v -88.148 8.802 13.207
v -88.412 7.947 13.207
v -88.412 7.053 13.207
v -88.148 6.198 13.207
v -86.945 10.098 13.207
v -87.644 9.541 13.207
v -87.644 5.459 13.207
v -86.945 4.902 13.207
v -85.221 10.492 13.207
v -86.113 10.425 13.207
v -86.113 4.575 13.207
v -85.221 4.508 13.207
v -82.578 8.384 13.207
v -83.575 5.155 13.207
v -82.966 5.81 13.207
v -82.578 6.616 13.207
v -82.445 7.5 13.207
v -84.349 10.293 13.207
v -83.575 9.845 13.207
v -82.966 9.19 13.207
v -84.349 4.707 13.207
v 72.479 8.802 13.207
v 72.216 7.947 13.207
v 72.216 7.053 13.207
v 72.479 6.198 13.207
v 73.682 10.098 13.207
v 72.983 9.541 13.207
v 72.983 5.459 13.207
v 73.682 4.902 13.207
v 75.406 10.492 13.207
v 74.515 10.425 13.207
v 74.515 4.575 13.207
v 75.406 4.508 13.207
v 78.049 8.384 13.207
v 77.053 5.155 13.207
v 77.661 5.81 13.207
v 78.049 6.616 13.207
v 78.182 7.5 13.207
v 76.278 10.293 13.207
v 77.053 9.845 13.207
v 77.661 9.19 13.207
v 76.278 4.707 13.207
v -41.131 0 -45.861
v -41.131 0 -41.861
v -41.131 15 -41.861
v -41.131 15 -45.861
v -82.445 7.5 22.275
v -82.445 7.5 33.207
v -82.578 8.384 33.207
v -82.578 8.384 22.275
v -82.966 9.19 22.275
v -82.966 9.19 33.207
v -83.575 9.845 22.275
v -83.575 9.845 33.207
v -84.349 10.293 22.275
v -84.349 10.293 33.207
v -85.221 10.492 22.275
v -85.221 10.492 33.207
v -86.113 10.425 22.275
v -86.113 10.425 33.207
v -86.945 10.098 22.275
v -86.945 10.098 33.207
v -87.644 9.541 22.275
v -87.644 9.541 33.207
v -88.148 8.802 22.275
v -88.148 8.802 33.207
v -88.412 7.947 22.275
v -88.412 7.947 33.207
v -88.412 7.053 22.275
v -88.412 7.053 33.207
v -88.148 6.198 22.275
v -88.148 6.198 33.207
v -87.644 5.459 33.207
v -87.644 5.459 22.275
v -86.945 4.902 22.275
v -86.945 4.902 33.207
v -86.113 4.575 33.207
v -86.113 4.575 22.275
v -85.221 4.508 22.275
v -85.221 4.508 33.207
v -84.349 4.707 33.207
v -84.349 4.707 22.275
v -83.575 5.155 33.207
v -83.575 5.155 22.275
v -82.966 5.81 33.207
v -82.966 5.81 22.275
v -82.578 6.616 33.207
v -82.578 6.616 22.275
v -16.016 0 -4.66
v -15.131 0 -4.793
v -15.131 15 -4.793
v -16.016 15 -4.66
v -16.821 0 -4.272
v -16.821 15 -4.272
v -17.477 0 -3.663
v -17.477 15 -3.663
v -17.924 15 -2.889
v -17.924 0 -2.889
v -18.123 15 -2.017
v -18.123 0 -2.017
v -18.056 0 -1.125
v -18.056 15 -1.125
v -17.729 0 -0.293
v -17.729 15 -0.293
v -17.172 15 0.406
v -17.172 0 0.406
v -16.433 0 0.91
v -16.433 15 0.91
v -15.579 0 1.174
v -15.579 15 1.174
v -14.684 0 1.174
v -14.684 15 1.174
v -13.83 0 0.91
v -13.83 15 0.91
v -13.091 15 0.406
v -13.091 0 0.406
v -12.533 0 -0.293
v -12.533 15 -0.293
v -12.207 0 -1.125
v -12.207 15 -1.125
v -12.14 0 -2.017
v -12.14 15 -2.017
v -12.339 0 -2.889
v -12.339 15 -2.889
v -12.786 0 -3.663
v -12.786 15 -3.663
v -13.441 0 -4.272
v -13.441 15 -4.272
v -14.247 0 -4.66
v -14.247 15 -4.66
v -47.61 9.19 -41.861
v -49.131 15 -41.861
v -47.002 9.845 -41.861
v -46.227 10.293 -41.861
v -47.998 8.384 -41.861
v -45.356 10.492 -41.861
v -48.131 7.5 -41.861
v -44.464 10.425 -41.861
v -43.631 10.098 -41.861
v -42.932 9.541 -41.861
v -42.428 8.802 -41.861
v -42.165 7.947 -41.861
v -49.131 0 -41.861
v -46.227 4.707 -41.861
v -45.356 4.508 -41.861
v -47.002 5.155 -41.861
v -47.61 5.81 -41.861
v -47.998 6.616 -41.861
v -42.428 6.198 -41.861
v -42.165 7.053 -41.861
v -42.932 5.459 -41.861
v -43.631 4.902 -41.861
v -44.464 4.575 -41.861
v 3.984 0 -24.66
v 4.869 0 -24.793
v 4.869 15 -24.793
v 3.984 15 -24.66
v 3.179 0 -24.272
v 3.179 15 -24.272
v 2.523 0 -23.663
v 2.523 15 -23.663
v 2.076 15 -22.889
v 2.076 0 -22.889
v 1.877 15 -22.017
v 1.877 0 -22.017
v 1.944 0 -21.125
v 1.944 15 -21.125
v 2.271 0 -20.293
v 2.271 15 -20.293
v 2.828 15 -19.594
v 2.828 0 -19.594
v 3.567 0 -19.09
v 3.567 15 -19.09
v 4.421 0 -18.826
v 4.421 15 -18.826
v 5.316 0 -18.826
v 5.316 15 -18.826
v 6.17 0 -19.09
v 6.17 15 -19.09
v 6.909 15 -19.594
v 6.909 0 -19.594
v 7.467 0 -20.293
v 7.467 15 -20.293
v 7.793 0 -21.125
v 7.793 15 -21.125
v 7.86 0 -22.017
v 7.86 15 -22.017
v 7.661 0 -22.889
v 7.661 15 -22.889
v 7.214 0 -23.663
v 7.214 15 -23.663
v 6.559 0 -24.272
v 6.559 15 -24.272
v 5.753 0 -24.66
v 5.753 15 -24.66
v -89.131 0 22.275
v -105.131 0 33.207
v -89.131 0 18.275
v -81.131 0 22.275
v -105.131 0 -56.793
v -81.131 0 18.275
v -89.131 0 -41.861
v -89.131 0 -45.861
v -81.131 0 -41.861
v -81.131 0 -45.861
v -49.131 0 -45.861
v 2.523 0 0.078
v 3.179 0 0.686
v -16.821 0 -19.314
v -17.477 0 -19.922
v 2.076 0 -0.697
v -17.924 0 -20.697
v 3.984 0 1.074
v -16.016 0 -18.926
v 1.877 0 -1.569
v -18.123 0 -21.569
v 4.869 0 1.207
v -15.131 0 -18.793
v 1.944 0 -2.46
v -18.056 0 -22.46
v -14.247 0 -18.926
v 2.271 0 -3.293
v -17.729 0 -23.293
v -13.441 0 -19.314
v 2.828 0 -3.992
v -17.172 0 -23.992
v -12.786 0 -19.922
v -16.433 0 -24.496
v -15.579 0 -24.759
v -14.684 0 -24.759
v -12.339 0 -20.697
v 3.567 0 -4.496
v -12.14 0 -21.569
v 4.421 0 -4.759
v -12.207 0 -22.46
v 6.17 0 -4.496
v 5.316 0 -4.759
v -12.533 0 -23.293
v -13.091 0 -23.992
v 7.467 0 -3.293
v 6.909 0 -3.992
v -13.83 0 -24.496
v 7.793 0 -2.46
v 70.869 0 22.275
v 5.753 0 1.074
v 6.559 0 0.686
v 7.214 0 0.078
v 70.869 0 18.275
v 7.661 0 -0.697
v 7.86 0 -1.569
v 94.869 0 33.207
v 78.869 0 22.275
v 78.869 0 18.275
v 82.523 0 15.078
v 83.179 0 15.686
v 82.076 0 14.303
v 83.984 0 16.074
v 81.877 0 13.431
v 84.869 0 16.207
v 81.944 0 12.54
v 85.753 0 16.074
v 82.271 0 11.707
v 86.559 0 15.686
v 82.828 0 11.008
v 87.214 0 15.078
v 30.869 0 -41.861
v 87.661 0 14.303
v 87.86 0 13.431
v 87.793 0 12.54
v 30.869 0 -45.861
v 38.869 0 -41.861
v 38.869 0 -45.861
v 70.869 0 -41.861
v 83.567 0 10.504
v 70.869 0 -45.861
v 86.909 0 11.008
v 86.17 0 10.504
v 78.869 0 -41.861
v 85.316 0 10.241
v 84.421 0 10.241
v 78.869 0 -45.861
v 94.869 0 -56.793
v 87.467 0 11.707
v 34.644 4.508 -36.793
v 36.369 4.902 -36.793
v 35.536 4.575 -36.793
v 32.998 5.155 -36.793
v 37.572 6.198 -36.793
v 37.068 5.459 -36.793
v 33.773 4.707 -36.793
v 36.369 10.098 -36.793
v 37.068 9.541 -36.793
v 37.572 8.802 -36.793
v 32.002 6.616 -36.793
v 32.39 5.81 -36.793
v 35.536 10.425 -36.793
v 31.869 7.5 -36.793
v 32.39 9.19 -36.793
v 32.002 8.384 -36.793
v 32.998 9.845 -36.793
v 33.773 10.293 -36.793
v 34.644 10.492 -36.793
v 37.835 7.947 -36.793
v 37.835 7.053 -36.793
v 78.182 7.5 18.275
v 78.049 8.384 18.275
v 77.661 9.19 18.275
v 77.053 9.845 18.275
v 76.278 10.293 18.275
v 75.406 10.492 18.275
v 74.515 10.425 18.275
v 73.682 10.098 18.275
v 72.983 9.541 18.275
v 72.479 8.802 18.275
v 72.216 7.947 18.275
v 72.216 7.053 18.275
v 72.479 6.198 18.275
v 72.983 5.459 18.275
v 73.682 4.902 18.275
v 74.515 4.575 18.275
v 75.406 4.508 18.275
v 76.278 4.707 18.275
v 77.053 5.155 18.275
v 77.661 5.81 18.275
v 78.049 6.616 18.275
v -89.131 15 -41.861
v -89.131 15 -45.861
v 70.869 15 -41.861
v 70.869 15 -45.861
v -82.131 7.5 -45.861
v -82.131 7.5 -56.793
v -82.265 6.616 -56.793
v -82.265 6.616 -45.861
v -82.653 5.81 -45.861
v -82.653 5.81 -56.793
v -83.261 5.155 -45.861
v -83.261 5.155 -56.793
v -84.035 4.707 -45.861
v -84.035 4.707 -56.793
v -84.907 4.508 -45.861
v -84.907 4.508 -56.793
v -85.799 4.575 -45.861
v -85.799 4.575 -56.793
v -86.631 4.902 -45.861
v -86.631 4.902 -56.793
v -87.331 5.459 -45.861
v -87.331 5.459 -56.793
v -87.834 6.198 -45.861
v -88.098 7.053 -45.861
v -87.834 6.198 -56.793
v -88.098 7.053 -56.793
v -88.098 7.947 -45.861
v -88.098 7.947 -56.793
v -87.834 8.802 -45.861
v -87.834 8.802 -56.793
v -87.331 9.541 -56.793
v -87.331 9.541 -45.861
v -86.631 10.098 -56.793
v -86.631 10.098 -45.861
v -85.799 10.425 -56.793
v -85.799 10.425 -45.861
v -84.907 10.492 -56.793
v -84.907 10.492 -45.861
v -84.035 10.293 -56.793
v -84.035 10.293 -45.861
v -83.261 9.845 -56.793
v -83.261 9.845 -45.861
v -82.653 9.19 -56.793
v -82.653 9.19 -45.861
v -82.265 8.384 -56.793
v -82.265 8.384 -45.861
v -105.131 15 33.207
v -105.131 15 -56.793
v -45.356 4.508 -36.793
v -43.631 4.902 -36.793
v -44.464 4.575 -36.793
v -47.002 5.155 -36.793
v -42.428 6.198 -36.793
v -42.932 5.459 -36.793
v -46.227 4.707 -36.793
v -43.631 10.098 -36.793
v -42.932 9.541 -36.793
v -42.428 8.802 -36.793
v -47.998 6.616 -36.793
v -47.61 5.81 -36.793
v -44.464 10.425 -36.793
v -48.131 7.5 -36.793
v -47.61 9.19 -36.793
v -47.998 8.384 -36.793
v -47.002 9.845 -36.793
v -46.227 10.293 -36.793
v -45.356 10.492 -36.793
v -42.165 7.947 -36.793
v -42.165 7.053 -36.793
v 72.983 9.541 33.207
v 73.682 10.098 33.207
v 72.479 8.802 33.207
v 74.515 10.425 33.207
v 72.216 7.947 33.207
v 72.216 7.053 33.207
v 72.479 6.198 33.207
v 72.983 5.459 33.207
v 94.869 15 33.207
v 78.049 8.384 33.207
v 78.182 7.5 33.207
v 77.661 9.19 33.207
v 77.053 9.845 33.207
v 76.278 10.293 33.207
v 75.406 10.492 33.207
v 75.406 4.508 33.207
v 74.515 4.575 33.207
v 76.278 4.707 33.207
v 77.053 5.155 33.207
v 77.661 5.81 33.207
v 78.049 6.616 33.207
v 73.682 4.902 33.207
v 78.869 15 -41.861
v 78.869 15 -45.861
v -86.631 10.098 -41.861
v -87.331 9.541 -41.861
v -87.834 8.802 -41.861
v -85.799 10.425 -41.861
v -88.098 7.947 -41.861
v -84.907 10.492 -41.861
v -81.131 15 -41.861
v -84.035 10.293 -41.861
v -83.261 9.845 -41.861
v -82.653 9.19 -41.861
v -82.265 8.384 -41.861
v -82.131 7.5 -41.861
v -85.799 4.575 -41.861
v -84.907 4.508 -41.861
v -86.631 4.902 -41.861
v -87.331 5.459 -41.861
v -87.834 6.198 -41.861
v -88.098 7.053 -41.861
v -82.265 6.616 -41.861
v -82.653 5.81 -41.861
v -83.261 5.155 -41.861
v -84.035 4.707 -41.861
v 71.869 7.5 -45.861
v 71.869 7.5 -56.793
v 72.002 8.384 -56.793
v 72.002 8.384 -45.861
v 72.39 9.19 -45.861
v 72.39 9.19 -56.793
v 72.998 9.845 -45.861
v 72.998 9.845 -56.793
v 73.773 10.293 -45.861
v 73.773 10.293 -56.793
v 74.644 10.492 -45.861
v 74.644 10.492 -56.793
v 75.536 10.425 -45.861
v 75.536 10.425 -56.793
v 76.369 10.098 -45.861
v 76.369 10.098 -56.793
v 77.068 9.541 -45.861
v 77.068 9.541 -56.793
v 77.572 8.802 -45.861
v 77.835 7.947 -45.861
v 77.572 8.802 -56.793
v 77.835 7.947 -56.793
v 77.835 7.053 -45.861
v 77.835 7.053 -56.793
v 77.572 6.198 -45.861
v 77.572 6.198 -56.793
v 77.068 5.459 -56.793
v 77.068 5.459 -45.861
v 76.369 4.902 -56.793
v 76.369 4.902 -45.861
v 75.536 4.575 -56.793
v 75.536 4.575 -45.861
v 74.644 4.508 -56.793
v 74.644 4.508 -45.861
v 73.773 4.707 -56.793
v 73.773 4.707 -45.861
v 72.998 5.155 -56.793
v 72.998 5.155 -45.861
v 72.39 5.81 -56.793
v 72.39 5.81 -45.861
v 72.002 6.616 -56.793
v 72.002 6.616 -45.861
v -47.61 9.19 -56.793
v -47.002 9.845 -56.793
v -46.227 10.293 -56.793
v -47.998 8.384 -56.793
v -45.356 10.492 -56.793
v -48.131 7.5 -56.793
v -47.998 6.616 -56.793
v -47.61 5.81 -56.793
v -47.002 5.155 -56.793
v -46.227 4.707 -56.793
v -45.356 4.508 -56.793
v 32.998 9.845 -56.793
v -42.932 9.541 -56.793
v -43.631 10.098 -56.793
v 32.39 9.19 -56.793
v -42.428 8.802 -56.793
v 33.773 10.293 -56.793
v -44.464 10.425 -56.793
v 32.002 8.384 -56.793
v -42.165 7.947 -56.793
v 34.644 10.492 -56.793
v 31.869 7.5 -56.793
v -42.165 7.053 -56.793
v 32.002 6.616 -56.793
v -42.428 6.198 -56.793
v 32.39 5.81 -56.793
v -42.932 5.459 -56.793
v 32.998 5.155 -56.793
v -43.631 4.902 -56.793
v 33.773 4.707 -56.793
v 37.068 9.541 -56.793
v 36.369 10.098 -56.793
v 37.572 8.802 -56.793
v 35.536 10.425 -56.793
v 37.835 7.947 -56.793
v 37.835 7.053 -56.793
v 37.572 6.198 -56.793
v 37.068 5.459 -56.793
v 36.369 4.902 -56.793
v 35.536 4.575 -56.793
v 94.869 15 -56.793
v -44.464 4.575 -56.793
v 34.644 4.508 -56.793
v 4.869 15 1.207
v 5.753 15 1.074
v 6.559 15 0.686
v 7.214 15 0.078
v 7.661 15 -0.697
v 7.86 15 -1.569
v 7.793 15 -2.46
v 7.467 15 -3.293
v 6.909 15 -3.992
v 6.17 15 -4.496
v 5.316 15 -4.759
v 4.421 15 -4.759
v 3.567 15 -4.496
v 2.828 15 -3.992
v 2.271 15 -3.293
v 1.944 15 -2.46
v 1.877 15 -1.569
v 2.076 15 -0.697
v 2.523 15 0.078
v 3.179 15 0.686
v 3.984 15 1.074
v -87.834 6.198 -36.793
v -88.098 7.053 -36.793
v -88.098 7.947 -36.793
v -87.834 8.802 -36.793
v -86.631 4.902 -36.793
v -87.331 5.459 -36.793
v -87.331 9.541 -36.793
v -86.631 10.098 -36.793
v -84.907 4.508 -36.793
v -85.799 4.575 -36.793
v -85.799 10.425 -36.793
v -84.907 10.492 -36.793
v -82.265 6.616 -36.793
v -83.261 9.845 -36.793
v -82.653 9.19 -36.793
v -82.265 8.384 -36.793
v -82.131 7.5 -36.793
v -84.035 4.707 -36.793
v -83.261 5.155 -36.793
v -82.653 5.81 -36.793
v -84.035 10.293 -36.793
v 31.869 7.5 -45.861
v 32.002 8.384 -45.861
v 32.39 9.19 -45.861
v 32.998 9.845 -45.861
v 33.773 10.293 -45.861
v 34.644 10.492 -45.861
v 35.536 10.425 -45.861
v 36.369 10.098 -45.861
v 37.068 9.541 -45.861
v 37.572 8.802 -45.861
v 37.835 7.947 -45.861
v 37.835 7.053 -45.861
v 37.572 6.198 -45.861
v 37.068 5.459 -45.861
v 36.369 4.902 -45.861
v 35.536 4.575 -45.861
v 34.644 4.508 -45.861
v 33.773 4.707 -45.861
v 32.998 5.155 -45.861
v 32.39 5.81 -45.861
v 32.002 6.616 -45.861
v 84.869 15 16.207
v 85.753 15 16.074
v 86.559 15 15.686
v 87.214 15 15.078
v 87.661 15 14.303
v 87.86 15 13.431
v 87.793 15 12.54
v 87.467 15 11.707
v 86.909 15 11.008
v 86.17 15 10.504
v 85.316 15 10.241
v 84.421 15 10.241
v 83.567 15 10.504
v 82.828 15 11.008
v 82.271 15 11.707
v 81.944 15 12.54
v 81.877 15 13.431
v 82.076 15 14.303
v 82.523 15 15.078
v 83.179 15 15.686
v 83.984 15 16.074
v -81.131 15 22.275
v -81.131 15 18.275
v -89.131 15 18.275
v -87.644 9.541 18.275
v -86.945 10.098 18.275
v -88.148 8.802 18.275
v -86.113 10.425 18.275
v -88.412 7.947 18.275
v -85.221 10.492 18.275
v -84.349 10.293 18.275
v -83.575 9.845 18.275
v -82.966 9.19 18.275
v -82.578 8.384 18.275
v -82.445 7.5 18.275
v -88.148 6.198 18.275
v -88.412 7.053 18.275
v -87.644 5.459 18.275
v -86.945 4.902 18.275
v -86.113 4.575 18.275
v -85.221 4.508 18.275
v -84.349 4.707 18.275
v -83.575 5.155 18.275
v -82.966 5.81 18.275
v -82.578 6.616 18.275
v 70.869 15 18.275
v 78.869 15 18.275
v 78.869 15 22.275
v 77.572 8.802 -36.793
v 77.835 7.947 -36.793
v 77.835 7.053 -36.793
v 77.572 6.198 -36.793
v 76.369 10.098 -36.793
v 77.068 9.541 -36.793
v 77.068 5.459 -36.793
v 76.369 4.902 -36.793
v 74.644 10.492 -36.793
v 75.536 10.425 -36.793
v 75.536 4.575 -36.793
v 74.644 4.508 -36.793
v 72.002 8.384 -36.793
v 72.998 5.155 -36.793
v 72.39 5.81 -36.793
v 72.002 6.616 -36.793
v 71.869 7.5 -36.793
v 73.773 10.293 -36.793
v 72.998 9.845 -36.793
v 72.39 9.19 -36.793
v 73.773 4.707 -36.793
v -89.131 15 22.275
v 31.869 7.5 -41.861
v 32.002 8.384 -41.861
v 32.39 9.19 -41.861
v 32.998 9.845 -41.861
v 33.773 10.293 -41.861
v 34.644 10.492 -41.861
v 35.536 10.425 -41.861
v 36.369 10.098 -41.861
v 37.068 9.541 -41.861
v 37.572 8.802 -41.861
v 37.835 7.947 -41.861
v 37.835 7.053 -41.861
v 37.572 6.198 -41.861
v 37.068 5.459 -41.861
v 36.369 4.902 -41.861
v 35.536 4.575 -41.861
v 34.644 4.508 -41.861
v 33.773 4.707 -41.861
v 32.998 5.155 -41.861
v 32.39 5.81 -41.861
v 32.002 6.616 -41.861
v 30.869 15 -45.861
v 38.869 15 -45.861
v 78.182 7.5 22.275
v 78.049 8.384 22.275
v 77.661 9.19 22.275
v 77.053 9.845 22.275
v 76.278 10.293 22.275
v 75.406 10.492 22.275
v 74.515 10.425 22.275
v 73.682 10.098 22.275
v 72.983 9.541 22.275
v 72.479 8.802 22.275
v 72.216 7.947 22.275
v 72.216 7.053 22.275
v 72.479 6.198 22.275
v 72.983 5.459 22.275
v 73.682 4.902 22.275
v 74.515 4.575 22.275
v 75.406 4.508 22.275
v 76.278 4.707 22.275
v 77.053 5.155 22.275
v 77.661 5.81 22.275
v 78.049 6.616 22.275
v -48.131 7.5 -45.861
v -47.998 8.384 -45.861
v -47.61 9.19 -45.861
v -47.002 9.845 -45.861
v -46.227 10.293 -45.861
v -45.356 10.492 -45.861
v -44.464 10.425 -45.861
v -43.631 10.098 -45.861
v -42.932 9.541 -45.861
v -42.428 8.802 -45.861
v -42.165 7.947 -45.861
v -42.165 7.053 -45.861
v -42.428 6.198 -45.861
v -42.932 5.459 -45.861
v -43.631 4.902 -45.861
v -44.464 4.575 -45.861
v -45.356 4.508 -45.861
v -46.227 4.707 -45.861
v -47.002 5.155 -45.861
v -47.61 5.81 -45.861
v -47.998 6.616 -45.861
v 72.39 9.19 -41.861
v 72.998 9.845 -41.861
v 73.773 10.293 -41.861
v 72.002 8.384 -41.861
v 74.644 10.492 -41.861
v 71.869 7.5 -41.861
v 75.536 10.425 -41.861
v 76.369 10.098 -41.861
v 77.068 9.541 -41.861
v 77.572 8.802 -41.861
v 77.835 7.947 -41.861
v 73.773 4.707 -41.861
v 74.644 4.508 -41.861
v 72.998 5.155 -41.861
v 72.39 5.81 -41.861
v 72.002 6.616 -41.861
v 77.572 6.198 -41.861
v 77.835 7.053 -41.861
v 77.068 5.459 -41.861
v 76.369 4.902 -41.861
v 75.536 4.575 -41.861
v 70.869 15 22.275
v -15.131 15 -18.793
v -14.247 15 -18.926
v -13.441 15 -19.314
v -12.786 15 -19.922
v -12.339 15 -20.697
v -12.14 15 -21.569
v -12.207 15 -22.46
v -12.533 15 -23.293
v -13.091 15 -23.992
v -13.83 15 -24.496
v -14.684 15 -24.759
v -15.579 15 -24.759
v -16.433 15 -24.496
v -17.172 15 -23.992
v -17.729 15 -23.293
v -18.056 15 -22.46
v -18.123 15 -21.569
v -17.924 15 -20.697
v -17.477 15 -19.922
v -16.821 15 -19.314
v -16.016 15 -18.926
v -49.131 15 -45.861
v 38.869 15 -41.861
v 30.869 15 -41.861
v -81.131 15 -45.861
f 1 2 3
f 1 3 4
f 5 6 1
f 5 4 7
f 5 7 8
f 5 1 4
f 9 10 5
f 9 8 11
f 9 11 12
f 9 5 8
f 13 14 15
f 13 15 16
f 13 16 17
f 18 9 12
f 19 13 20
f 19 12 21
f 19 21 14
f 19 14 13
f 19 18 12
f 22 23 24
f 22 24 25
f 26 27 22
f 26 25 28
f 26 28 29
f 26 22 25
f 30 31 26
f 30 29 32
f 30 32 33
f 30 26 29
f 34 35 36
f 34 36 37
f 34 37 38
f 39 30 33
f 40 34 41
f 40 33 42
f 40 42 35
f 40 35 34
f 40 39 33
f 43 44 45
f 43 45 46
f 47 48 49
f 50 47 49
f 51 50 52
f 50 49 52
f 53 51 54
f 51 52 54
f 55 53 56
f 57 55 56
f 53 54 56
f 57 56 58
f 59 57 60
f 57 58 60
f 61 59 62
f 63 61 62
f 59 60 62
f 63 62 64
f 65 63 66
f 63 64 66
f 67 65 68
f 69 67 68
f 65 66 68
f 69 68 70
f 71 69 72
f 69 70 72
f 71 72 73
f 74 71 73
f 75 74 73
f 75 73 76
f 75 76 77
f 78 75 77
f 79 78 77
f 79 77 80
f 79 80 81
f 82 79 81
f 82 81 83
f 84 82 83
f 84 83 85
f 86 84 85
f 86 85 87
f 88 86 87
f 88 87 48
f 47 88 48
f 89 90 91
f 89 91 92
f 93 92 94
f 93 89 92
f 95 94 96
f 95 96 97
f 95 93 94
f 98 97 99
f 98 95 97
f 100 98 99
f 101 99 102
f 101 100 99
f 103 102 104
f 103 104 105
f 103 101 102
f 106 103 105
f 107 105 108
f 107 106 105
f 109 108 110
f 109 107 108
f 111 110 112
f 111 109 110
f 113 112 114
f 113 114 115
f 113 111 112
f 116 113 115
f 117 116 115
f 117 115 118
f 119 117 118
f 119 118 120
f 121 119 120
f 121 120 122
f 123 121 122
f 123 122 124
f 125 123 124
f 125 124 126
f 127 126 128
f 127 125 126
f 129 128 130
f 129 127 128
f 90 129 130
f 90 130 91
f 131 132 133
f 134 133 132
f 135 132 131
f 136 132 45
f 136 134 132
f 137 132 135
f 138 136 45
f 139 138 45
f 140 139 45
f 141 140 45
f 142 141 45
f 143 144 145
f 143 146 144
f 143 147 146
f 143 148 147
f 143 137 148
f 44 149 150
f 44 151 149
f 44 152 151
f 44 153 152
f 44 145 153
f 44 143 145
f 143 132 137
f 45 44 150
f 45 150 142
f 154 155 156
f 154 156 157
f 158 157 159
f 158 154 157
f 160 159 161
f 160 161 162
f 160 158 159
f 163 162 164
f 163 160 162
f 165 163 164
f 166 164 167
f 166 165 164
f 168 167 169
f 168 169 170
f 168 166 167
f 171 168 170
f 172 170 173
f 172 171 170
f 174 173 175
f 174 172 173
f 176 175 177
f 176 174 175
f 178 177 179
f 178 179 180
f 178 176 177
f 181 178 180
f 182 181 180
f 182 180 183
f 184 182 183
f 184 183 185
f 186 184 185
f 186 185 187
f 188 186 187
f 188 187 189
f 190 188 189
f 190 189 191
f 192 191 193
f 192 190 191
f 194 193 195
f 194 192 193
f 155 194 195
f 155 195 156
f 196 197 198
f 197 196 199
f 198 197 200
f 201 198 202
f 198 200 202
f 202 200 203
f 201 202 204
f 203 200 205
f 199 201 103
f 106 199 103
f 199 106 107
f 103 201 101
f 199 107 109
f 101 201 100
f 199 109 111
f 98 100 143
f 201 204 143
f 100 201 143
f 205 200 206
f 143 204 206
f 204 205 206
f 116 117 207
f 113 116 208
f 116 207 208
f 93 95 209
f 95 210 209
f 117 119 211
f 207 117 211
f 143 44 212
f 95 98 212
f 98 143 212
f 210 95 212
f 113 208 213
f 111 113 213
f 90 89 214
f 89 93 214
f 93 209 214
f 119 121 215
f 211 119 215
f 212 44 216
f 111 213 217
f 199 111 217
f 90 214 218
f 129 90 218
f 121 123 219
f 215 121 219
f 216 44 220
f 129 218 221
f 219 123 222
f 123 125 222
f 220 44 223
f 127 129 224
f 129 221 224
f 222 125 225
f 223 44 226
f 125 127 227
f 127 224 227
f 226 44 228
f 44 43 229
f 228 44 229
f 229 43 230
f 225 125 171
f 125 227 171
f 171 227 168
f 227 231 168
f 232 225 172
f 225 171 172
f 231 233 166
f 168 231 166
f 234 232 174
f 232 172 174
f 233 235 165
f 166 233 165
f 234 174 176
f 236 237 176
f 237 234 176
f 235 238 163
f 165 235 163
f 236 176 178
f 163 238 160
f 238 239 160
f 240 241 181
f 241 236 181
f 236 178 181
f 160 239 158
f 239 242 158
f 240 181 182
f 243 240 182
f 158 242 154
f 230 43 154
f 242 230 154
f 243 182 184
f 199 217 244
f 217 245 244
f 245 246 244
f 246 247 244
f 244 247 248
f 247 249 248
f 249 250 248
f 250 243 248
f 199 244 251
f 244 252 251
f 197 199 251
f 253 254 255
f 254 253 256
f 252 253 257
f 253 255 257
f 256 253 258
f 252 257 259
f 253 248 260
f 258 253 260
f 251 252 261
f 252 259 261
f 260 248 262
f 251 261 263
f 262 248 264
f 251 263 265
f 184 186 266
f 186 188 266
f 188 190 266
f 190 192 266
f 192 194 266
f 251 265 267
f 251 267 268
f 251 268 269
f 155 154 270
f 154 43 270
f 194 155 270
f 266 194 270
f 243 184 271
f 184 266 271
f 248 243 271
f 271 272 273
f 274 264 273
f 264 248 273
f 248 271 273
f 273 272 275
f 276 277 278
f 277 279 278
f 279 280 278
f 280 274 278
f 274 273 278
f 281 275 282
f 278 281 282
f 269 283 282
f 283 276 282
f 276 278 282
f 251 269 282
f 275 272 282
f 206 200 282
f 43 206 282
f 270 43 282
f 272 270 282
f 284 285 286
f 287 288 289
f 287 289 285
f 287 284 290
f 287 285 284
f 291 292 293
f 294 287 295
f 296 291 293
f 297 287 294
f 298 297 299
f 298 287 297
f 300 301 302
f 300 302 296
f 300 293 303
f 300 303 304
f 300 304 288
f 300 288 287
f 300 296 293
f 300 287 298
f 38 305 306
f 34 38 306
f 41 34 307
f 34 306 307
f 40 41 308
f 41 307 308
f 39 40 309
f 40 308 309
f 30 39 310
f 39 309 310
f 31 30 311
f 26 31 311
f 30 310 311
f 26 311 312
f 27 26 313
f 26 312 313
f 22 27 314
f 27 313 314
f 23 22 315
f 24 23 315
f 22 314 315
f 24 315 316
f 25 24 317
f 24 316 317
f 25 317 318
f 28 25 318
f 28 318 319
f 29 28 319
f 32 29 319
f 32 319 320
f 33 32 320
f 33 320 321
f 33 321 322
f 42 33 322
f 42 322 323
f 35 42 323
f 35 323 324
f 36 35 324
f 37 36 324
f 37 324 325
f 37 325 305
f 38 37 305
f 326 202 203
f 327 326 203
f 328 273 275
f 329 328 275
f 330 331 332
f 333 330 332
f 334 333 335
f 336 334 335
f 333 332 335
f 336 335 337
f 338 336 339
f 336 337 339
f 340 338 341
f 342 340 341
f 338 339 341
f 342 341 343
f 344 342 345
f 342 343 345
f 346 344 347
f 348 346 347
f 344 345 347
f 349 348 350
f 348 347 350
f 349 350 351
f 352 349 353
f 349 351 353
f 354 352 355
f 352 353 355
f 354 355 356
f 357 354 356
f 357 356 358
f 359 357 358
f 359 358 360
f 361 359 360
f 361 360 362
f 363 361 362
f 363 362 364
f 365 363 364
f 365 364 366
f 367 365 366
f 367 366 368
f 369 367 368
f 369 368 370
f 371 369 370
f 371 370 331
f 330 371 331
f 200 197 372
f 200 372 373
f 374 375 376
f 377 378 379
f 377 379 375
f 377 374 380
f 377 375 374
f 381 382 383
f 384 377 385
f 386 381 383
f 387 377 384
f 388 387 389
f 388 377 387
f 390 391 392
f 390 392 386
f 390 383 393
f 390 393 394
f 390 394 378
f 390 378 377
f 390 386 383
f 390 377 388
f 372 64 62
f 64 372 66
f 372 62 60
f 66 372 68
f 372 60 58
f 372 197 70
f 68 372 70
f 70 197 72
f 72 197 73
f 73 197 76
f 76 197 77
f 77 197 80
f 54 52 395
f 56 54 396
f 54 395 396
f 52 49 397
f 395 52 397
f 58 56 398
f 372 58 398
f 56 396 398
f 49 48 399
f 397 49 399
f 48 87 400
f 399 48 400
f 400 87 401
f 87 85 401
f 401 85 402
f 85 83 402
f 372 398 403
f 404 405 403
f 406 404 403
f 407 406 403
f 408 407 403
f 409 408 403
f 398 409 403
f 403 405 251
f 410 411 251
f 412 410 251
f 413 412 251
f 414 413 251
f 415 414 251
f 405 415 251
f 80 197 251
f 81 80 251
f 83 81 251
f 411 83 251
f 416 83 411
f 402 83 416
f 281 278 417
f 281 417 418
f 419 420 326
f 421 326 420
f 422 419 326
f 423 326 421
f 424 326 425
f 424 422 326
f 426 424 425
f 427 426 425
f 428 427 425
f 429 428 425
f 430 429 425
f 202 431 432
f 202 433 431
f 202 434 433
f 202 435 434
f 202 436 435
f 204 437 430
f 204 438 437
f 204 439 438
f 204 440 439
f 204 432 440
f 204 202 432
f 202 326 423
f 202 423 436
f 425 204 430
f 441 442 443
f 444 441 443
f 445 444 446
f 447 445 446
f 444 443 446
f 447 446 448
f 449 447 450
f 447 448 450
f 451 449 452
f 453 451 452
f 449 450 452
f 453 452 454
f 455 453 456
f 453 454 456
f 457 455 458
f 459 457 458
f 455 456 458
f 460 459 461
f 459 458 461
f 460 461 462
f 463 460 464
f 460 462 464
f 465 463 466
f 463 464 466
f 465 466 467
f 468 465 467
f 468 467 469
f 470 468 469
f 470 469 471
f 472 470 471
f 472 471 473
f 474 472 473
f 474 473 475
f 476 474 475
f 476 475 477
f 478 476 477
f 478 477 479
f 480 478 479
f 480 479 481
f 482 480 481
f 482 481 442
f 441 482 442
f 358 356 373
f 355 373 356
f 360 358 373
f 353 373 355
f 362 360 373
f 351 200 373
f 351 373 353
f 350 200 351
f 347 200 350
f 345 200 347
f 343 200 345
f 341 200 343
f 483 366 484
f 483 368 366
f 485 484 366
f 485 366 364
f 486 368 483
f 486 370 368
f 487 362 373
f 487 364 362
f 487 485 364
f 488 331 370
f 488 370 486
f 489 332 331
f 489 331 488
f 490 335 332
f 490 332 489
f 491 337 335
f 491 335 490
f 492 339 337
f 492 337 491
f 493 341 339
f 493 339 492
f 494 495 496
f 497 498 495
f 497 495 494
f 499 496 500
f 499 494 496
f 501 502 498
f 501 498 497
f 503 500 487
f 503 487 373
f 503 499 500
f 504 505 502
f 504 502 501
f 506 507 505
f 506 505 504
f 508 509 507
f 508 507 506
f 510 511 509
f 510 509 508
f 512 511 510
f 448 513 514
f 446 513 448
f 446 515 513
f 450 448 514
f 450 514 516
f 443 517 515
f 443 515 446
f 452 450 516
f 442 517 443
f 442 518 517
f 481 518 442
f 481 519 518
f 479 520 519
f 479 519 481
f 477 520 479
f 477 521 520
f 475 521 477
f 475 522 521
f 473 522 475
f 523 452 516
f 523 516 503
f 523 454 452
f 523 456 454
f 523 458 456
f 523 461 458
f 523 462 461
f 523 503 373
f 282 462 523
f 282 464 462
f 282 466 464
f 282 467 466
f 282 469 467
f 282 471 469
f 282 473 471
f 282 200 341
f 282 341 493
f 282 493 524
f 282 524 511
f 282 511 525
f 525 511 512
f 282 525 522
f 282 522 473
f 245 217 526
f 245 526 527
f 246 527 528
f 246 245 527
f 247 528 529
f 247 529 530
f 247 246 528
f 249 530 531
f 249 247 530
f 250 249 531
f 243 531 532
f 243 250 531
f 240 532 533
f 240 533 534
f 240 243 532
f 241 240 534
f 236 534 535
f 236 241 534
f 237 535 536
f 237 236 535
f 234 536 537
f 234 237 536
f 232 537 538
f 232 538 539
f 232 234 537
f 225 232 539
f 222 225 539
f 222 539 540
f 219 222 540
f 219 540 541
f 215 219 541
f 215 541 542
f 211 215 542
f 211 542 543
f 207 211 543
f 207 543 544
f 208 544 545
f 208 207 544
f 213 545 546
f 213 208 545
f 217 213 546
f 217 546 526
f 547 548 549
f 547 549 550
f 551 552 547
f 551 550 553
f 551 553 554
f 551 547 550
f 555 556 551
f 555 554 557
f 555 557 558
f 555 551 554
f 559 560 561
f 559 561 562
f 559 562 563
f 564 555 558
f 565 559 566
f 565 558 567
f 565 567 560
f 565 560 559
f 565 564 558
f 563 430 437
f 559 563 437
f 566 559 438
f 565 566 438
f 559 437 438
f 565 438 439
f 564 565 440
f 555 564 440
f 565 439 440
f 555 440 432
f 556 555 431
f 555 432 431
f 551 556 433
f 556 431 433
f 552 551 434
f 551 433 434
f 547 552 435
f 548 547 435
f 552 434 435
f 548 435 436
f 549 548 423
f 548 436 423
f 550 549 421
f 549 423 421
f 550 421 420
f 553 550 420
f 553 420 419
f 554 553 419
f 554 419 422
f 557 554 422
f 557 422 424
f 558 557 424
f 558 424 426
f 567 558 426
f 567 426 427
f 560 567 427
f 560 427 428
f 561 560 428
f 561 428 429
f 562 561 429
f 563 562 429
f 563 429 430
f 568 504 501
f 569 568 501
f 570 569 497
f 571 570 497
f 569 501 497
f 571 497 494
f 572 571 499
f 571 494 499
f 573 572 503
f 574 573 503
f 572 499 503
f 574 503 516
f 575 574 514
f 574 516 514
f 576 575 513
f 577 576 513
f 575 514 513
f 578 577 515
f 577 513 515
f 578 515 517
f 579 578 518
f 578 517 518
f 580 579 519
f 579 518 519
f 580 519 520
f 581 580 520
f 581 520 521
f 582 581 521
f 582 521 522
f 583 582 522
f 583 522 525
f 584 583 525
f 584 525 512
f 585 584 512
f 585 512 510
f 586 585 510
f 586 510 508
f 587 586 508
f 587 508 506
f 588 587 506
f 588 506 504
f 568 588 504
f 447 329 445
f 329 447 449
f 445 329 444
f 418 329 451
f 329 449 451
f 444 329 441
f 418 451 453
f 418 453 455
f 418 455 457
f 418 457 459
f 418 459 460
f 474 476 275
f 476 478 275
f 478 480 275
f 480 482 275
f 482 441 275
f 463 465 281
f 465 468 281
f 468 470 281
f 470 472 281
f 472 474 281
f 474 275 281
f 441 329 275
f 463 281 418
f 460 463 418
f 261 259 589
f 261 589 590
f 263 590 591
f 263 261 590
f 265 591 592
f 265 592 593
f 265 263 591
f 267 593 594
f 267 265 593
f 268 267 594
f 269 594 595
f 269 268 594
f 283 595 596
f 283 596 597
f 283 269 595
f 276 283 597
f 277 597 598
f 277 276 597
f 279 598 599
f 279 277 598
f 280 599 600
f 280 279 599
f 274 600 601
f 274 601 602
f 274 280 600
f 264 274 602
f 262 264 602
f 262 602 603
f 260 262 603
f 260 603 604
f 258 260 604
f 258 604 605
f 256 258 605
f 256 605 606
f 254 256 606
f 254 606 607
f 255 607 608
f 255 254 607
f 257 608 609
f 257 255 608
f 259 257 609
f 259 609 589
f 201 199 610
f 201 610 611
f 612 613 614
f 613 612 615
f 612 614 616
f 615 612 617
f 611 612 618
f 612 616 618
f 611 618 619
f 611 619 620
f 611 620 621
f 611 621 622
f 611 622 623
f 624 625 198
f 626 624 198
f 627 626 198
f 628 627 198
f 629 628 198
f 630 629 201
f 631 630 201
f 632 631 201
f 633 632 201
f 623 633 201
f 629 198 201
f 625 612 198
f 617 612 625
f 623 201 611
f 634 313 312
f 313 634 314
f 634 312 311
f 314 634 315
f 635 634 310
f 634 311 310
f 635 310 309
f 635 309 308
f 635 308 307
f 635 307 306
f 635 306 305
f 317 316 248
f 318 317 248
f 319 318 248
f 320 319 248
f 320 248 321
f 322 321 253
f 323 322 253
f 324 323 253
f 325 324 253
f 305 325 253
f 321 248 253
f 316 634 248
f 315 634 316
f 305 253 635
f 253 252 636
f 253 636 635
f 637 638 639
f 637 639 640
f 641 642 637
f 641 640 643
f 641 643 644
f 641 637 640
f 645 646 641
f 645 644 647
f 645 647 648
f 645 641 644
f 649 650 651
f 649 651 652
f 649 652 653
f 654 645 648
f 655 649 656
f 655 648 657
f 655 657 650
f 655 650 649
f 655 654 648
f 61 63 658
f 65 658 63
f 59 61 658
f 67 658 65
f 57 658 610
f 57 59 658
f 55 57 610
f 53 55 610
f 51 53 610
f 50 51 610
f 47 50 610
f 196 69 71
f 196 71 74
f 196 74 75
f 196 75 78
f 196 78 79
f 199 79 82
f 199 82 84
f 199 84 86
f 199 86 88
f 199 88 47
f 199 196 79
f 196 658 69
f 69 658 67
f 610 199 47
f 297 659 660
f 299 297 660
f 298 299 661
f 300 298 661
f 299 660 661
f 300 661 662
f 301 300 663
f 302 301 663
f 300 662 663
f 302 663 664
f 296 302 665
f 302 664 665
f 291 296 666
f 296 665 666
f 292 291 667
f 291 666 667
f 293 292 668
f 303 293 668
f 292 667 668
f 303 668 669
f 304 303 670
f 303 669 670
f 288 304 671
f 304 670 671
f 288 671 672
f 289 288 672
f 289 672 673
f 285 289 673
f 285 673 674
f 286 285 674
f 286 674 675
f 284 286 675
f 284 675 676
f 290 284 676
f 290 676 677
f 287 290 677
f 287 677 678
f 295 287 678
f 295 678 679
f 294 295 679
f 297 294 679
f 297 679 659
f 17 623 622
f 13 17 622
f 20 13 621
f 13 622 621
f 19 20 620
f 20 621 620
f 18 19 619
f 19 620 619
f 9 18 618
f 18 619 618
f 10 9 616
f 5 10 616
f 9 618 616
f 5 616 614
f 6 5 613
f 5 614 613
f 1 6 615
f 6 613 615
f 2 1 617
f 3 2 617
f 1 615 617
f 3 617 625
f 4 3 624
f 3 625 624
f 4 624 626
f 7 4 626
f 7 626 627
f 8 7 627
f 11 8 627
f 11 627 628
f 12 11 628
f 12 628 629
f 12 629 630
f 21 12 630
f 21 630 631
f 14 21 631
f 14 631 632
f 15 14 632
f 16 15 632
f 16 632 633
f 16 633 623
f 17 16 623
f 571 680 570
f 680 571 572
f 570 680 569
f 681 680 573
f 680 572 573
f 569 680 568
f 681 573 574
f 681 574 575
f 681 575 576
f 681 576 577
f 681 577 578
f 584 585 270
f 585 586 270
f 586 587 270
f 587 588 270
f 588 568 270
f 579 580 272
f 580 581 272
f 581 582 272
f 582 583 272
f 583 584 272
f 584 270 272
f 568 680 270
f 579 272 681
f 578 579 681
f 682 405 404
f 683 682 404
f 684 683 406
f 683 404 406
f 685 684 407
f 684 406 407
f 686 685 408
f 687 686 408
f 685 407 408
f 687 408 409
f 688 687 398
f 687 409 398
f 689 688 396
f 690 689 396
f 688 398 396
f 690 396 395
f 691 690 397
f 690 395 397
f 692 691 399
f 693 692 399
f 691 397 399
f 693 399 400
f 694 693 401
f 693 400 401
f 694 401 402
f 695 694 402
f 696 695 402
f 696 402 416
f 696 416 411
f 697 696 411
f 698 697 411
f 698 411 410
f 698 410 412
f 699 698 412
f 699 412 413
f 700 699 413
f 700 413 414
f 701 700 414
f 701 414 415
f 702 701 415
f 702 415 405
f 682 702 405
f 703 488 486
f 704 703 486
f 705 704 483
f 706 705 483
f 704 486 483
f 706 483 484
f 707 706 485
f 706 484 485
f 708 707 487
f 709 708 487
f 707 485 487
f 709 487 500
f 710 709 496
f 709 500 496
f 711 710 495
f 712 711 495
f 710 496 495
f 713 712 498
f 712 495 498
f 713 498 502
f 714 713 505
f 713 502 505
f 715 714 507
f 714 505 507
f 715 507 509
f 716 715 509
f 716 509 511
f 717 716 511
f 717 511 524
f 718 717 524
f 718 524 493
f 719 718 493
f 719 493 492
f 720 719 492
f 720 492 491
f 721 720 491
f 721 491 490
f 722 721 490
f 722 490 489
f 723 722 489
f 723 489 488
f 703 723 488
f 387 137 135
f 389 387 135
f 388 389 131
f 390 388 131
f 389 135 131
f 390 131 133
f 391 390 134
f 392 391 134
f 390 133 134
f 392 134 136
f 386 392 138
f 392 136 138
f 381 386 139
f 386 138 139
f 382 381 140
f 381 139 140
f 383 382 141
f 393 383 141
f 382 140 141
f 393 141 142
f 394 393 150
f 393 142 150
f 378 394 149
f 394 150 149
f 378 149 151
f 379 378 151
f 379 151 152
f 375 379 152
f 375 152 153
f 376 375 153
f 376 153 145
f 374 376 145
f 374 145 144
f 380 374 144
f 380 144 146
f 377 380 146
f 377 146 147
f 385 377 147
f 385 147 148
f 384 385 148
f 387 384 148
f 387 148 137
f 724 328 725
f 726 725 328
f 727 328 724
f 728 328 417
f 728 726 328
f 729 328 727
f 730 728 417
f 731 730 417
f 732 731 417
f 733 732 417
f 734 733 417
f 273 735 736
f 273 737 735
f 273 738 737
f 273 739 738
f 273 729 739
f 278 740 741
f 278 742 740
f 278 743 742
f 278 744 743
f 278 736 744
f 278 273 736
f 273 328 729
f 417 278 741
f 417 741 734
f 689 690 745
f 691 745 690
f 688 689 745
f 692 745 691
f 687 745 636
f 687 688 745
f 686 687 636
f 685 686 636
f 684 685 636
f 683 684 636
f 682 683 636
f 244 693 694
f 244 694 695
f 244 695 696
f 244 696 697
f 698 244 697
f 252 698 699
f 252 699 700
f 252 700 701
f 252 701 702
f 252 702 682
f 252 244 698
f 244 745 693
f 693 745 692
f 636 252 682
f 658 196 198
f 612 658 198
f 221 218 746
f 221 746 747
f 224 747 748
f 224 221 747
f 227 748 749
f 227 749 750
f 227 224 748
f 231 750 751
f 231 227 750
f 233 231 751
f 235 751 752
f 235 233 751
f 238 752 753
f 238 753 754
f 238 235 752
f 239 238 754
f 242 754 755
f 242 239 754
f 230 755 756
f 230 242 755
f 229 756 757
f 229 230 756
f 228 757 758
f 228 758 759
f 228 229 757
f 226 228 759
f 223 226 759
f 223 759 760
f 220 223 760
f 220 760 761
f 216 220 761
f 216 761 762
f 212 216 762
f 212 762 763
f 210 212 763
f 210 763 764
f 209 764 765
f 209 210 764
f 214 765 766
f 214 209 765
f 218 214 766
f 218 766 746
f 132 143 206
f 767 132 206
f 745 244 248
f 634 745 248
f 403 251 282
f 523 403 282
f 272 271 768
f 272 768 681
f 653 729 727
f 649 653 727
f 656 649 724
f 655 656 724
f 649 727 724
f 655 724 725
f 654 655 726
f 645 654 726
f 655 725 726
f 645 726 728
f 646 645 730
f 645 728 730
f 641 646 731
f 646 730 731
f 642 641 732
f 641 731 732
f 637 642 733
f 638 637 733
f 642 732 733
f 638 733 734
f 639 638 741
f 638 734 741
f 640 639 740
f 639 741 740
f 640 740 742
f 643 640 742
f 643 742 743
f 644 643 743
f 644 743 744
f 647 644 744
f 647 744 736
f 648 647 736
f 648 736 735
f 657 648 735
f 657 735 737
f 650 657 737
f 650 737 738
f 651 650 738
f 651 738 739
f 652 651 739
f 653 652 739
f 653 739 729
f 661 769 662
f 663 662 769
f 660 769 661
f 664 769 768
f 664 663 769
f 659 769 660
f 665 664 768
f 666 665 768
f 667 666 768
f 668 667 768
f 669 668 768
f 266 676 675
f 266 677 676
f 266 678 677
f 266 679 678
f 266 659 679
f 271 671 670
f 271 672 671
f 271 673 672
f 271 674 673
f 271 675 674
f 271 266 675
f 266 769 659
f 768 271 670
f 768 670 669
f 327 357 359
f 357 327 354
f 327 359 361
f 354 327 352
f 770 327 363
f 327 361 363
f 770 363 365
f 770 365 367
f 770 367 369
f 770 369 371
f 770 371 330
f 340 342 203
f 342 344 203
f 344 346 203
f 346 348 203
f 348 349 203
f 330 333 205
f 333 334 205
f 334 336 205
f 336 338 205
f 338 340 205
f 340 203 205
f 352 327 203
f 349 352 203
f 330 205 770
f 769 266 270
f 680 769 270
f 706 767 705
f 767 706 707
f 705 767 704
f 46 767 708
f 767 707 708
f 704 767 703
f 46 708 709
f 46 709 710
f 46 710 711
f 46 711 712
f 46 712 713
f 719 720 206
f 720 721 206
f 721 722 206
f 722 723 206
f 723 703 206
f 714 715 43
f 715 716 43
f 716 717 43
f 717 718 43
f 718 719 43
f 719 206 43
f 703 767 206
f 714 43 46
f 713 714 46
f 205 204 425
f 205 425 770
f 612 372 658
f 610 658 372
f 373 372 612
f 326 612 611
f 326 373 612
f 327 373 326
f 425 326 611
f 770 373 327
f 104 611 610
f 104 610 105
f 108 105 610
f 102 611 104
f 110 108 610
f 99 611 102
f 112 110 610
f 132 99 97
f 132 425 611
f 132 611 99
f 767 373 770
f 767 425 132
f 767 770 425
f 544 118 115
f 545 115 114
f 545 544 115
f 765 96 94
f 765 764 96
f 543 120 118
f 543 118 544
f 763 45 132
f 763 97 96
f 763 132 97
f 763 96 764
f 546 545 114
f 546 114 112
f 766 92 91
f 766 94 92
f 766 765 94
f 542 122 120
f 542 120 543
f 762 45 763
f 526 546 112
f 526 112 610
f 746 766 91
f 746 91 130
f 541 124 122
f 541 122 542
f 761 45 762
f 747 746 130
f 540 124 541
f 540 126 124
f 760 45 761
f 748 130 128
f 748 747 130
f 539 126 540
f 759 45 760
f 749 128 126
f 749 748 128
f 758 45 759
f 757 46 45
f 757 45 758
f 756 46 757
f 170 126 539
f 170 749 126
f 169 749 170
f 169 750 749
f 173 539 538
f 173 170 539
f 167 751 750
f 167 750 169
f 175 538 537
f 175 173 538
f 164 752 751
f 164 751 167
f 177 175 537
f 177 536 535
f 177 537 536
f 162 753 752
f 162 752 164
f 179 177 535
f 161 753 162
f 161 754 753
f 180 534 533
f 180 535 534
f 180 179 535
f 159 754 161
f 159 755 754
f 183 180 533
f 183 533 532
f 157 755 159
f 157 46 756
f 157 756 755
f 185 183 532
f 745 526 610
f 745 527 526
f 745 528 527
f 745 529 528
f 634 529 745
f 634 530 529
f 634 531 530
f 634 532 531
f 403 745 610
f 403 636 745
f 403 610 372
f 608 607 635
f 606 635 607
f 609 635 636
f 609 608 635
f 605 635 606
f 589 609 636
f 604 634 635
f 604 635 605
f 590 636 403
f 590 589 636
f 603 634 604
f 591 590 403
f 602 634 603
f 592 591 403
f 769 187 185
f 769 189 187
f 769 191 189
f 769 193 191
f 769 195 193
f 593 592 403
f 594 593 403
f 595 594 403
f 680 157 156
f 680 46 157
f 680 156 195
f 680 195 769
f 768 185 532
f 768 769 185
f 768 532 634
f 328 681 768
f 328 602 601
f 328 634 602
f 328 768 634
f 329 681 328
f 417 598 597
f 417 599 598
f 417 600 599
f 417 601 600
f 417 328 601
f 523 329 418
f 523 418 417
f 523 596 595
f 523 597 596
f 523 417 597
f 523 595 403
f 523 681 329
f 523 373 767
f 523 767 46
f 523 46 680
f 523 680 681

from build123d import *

# Parameters (mm, degrees)
SKETCH1_W           = 200
SKETCH1_H           = 90
SKETCH1_R           = 3
SKETCH1_W_2         = 8
SKETCH1_H_2         = 4
BOSS_EXTRUDE1_DEPTH = 15
SKETCH2_R           = 3
CUT_EXTRUDE1_DEPTH  = 20
SKETCH3_R           = 3
CUT_EXTRUDE2_DEPTH  = 20


with BuildPart() as part:
    # Sketch1 → Boss-Extrude1 (new body)
    with BuildSketch(Plane(origin=(0, 0, 0), x_dir=(1, 0, 0), z_dir=(0, 1, 0))):
        with Locations((-5.131403118, 11.792873051)):
            Rectangle(SKETCH1_W, SKETCH1_H)
        with Locations(Location((-15.131403118, 21.792873051, 0), (0, 0, 270))):
            Circle(SKETCH1_R, mode=Mode.SUBTRACT)
        with Locations(Location((-15.131403118, 1.792873051, 0), (0, 0, 90))):
            Circle(SKETCH1_R, mode=Mode.SUBTRACT)
        with Locations(Location((4.868596882, 21.792873051, 0), (0, 0, 90))):
            Circle(SKETCH1_R, mode=Mode.SUBTRACT)
        with Locations(Location((4.868596882, 1.792873051, 0), (0, 0, 270))):
            Circle(SKETCH1_R, mode=Mode.SUBTRACT)
        with Locations(Location((84.868596882, -13.207126949, 0), (0, 0, 270))):
            Circle(SKETCH1_R, mode=Mode.SUBTRACT)
        with Locations((-85.131403118, 43.860843617)):
            Rectangle(SKETCH1_W_2, SKETCH1_H_2, mode=Mode.SUBTRACT)
        with Locations((-45.131403118, 43.860843617)):
            Rectangle(SKETCH1_W_2, SKETCH1_H_2, mode=Mode.SUBTRACT)
        with Locations((34.868596882, 43.860843617)):
            Rectangle(SKETCH1_W_2, SKETCH1_H_2, mode=Mode.SUBTRACT)
        with Locations((74.868596882, 43.860843617)):
            Rectangle(SKETCH1_W_2, SKETCH1_H_2, mode=Mode.SUBTRACT)
        with Locations((74.868596882, -20.275097514)):
            Rectangle(SKETCH1_W_2, SKETCH1_H_2, mode=Mode.SUBTRACT)
        with Locations((-85.131403118, -20.275097514)):
            Rectangle(SKETCH1_W_2, SKETCH1_H_2, mode=Mode.SUBTRACT)
    extrude(amount=BOSS_EXTRUDE1_DEPTH)

    # Sketch2 → Cut-Extrude1 (cut)
    with BuildSketch(Plane(origin=(0, 0, -56.792873051), x_dir=(-1, 0, 0), z_dir=(0, 0, -1))):
        with Locations((-74.868596882, 7.5)):
            Circle(SKETCH2_R)
        with Locations((-34.868596882, 7.5)):
            Circle(SKETCH2_R)
        with Locations((45.131403118, 7.5)):
            Circle(SKETCH2_R)
        with Locations(Location((85.131403118, 7.5, 0), (0, 0, 180))):
            Circle(SKETCH2_R)
    extrude(amount=-CUT_EXTRUDE1_DEPTH, mode=Mode.SUBTRACT)

    # Sketch3 → Cut-Extrude2 (cut)
    with BuildSketch(Plane.XY.offset(33.207126949)):
        with Locations((-85.445029849, 7.5)):
            Circle(SKETCH3_R)
        with Locations((75.182223613, 7.5)):
            Circle(SKETCH3_R)
    extrude(amount=-CUT_EXTRUDE2_DEPTH, mode=Mode.SUBTRACT)


solid = part.part
